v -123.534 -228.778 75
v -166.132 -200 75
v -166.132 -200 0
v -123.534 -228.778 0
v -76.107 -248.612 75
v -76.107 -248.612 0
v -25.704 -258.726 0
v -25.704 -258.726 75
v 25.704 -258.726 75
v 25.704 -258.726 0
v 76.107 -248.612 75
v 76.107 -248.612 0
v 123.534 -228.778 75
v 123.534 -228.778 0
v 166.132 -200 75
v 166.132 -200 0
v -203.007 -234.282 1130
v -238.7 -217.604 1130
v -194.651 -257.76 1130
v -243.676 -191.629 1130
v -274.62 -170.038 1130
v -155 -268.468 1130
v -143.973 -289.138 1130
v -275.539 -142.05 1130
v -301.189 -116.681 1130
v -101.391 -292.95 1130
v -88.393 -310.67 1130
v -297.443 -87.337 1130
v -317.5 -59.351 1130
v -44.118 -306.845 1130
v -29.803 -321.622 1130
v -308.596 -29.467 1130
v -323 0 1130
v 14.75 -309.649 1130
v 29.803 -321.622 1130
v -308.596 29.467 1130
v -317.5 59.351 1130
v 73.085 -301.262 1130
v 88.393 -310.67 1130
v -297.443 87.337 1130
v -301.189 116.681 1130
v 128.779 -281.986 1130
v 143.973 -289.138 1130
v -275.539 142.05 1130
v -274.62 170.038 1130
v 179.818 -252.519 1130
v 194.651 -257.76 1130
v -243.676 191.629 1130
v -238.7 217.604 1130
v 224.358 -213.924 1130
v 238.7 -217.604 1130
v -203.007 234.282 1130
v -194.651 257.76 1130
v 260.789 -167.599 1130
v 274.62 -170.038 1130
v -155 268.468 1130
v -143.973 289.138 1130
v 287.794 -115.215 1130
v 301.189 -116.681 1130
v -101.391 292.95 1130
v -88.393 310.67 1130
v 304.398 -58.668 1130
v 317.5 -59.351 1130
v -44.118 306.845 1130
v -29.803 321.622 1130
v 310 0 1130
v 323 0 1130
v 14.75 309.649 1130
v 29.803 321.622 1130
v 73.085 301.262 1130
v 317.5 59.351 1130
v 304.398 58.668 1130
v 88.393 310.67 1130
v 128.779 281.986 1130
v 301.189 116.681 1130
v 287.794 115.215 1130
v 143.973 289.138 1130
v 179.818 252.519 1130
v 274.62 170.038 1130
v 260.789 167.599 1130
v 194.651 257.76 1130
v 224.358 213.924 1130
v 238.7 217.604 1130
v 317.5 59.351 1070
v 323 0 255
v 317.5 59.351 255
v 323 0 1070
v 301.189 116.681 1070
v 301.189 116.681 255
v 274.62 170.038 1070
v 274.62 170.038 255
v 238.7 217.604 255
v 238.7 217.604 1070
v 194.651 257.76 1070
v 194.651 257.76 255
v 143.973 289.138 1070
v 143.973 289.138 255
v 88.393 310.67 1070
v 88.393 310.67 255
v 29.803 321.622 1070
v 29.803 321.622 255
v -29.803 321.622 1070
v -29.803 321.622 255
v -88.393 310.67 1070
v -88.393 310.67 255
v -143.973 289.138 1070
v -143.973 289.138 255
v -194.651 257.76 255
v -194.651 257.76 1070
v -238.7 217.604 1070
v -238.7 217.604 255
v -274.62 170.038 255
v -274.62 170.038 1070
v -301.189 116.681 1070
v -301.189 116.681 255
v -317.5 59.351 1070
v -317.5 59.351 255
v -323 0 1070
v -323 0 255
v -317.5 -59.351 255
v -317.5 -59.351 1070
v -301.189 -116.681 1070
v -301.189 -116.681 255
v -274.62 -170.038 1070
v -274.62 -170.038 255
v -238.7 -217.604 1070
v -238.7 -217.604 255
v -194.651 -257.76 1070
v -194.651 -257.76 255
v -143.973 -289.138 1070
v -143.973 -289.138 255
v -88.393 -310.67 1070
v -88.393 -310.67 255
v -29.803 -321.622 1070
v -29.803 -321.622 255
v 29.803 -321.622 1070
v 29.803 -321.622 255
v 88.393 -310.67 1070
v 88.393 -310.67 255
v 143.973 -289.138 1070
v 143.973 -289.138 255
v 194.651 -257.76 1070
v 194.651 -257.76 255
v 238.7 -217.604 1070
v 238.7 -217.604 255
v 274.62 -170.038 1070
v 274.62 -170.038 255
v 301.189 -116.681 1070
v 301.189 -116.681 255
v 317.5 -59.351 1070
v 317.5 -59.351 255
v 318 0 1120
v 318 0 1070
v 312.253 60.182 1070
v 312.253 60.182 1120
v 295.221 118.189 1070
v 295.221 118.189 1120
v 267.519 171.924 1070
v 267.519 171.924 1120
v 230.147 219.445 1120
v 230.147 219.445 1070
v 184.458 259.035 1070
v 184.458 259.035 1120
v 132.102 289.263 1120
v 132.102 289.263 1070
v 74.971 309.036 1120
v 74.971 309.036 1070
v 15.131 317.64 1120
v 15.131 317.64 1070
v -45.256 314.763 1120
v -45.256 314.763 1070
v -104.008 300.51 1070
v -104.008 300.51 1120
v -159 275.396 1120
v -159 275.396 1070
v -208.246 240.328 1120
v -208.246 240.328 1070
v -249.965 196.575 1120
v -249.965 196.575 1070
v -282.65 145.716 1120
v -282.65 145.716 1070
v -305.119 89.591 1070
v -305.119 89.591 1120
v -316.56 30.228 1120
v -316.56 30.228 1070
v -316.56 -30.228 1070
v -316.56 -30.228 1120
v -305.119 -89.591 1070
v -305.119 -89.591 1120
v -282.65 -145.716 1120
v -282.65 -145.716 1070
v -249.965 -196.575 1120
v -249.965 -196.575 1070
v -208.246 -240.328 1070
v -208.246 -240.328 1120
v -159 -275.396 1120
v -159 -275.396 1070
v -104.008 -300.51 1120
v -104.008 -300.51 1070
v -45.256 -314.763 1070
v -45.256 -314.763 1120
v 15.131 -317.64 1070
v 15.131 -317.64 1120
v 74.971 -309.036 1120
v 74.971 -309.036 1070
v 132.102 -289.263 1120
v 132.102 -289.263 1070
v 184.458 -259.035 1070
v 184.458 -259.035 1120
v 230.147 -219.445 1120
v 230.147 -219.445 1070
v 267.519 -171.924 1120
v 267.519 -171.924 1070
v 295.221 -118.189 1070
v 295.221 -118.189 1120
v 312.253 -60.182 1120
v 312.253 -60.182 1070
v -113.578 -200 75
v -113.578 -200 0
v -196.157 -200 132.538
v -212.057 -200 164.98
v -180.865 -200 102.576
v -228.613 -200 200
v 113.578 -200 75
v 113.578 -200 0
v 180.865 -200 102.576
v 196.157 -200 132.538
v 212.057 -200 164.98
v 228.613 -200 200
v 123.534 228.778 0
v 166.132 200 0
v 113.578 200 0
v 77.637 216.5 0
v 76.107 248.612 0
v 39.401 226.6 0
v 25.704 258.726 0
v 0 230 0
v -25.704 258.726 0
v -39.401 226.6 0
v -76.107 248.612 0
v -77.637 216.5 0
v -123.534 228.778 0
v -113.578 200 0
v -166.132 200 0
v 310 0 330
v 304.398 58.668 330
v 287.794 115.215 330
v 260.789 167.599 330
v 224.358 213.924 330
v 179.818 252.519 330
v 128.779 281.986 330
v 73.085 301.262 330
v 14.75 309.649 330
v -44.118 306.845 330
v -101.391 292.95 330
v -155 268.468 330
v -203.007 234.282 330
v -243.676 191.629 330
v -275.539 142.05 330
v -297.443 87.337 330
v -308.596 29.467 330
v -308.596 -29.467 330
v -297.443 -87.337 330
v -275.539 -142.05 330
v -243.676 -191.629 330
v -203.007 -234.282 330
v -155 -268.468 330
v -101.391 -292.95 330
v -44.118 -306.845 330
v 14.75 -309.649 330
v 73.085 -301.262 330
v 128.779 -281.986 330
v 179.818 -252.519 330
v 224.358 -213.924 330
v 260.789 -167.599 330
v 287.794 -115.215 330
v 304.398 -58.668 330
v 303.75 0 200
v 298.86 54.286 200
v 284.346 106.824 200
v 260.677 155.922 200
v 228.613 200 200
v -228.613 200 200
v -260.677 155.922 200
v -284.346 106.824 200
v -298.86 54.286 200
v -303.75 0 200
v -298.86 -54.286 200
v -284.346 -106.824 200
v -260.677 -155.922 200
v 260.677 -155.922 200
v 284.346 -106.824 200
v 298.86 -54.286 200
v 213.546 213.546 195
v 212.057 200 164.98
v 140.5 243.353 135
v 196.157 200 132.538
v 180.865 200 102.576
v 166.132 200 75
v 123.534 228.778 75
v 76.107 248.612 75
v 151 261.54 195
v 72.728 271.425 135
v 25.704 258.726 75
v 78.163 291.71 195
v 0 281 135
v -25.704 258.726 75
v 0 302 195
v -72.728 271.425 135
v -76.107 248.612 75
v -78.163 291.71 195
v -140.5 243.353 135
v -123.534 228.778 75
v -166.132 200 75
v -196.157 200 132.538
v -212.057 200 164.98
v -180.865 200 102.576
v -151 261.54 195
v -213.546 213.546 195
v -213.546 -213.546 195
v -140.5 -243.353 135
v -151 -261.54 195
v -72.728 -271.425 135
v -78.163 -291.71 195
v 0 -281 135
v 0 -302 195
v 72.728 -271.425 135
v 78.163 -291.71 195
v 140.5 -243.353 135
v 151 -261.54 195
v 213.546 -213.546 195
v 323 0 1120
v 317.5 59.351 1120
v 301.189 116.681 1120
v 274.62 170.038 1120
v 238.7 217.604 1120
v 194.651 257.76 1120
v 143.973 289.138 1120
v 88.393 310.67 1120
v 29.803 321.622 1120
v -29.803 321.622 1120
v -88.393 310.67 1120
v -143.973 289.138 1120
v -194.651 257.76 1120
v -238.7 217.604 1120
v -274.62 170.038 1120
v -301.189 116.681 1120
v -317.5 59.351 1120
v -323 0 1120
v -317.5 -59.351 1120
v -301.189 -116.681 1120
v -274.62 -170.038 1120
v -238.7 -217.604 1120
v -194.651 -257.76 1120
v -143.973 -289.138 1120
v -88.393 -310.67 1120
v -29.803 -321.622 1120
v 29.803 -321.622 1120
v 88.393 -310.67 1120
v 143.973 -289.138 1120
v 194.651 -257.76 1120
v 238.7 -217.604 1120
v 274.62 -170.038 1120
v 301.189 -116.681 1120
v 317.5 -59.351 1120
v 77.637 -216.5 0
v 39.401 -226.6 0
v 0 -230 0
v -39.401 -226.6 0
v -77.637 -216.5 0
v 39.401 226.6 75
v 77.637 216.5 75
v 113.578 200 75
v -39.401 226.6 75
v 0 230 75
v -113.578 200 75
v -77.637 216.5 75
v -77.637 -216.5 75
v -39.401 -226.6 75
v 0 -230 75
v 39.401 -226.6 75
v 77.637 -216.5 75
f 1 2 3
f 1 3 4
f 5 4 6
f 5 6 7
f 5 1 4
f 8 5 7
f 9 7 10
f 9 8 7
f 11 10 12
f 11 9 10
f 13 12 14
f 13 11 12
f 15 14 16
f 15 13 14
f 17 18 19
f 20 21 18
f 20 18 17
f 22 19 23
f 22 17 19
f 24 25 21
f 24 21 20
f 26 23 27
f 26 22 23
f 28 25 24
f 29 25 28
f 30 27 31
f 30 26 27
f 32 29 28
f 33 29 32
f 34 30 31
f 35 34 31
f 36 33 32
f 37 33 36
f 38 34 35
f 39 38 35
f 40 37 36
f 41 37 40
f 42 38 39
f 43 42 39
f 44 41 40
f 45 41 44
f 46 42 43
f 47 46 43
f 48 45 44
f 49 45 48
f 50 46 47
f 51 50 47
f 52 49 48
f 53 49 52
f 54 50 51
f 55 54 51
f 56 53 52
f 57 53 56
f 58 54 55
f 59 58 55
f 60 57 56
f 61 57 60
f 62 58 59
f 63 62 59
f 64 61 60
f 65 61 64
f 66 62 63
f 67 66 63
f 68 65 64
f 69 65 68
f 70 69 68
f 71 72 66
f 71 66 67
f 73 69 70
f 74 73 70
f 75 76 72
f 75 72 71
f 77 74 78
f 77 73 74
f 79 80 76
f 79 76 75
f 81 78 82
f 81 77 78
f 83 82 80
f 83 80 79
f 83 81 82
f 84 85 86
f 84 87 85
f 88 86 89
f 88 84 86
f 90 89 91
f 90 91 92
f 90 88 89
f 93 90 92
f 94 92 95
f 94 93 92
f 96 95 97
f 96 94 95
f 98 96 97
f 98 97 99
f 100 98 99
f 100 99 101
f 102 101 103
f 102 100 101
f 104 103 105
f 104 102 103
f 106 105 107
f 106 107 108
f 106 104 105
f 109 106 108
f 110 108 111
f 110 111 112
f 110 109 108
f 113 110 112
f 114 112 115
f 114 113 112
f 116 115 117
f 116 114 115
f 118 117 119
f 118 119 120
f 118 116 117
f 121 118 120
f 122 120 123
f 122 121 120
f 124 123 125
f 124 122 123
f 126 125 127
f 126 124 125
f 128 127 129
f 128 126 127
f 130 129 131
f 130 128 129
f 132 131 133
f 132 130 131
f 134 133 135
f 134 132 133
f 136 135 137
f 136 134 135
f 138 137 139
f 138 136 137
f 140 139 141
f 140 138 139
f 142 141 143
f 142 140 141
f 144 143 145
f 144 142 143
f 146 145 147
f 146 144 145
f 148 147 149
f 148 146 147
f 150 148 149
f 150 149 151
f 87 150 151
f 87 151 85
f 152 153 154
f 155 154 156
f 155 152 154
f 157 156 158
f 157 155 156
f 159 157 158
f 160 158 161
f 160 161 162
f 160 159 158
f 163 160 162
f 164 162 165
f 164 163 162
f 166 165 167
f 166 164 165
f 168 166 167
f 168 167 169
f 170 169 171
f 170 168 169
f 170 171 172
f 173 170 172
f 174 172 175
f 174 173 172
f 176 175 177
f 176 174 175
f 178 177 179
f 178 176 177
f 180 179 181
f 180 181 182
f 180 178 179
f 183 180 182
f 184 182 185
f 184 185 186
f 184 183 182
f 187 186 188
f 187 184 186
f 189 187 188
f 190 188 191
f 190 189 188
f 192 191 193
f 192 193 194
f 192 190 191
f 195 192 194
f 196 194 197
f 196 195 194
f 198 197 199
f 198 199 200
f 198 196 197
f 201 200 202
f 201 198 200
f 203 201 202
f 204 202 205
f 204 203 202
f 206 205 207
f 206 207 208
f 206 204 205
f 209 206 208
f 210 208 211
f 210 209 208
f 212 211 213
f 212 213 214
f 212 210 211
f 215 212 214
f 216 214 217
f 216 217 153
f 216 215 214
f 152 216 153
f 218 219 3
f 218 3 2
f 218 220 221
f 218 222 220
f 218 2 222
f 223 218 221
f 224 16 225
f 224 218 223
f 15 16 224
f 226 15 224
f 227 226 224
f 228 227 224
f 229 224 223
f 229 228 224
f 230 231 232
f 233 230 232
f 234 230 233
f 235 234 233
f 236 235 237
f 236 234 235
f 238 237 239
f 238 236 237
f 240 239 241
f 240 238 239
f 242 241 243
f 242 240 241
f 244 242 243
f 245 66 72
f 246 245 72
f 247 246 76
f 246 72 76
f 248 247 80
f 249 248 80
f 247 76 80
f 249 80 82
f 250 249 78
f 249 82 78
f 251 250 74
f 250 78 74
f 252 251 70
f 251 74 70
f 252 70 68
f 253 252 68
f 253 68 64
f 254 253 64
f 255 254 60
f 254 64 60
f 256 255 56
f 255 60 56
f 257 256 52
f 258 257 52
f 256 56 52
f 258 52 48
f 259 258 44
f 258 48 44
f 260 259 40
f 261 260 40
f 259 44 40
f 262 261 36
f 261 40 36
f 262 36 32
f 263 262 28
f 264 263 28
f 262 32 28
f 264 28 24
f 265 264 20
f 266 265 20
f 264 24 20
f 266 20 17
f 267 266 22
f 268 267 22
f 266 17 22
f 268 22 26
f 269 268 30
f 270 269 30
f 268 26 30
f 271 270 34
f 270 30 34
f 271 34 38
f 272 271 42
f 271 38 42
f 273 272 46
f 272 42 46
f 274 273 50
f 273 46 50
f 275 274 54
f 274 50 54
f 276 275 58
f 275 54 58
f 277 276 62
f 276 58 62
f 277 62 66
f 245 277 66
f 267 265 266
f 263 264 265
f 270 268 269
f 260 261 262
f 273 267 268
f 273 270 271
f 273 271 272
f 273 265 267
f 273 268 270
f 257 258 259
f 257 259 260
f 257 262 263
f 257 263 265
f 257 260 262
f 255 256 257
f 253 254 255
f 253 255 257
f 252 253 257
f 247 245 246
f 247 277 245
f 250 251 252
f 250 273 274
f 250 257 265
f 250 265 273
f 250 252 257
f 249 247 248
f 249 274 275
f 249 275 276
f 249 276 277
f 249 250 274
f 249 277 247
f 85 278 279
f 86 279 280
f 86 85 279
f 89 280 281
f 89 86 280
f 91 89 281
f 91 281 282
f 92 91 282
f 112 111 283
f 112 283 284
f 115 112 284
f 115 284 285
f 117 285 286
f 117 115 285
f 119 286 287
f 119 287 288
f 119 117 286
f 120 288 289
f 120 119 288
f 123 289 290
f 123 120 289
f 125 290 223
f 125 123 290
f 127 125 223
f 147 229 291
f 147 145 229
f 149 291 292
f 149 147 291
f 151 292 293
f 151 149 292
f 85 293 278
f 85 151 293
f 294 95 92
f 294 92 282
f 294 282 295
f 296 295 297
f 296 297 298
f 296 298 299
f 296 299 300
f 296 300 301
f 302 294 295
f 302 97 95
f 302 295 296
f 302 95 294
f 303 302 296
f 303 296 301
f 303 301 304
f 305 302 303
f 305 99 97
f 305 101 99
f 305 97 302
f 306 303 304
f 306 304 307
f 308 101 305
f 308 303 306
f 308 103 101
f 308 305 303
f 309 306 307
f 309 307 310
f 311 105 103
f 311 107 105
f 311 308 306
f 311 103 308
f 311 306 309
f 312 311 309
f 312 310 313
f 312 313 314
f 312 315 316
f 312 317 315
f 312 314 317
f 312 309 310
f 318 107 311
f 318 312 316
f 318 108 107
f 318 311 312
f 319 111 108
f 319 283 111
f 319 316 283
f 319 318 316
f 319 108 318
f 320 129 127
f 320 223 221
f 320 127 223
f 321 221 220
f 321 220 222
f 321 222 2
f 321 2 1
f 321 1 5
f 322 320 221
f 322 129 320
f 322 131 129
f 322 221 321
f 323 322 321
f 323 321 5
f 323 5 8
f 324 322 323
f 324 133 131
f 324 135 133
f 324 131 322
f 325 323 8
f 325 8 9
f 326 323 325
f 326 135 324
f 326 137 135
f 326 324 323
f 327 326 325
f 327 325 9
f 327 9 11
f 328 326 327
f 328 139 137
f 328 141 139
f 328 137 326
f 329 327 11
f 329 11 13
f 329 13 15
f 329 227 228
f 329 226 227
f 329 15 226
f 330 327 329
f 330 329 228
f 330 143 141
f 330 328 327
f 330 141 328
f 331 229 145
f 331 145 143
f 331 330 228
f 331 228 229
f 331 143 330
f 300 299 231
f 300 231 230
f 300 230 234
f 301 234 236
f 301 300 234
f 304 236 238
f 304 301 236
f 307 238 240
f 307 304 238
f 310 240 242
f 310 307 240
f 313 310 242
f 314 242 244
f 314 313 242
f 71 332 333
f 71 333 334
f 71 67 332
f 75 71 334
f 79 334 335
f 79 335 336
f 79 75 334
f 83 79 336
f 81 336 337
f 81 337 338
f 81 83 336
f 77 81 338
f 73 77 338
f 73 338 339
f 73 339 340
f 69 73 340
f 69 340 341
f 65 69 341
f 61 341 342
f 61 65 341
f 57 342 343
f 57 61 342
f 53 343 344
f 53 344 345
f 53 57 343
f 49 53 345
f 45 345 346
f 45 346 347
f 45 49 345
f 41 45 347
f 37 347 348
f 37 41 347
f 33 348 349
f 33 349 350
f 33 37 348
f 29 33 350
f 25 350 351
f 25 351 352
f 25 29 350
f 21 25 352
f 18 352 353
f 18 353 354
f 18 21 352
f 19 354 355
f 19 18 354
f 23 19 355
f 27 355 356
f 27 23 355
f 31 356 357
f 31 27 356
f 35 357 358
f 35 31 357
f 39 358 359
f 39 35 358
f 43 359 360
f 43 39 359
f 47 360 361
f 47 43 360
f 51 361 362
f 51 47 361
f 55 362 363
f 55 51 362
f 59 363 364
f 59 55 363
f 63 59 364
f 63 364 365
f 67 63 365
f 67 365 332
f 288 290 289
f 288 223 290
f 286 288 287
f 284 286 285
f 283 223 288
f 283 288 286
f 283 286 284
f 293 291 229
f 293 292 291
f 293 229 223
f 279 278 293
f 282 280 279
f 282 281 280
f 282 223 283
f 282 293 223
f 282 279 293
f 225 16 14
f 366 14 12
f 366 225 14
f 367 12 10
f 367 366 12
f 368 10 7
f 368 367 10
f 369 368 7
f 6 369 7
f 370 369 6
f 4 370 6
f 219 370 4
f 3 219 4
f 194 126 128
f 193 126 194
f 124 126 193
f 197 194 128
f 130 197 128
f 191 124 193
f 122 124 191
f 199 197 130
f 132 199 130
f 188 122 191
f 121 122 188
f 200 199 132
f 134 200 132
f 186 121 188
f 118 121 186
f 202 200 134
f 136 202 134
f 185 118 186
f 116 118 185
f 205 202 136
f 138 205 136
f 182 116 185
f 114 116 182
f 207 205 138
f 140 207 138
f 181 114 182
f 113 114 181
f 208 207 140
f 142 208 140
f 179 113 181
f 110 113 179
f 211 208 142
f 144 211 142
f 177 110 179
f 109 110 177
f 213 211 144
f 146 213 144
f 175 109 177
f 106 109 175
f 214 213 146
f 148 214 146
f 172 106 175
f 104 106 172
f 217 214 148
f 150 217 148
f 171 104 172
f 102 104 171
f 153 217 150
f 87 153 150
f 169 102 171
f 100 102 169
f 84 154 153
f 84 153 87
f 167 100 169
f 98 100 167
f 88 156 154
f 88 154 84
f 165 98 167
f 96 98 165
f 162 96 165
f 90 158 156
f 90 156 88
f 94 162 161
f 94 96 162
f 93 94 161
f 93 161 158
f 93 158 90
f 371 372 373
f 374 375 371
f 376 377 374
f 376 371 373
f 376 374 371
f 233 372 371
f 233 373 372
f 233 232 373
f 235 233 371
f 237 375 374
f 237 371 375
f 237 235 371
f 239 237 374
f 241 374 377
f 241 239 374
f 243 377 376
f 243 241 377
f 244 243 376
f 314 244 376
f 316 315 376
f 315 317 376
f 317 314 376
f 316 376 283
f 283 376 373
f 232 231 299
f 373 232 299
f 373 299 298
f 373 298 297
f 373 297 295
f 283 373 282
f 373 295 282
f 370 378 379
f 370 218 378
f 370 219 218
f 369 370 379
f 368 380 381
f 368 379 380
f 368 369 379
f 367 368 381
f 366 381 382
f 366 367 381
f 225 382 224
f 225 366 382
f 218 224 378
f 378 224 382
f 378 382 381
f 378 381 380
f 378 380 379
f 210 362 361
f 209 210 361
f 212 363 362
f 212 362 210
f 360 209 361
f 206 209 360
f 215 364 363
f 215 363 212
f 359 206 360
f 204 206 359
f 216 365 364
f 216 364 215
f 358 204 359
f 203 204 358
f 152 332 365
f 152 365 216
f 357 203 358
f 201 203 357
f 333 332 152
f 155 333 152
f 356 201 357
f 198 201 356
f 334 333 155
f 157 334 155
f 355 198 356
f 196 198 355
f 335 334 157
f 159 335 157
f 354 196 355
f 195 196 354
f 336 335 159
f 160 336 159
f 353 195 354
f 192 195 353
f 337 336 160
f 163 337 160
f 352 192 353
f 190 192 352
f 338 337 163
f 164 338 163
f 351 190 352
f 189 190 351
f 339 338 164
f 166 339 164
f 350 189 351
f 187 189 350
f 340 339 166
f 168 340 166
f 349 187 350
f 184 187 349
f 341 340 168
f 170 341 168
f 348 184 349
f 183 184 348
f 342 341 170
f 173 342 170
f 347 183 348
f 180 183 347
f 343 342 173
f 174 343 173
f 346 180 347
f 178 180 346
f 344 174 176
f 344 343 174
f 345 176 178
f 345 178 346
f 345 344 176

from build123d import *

# Parameters (mm, degrees)
F2_R     = 310
F3_DEPTH = 800
F4_W     = 400
F4_H     = 250
F5_DEPTH = 323.001
F6_DEPTH = 323.001


with BuildPart() as f1:
    # F0 (on Front) → F1 (revolve)
    with BuildSketch(Plane.XZ):
        Polygon((0, 1130), (0, 0), (30, 0), (30, 75), (230, 75), (230, 0), (260, 0), (260, 75), (323, 255), (323, 1070), (318, 1070), (318, 1120), (323, 1120), (323, 1130), align=None)
    revolve(axis=Axis((0, 0, 565), (0, 0, 1)))

    # F2 (on face) → F3 (cut)
    with BuildSketch(Plane.XY.offset(1130)):
        Circle(F2_R)
    extrude(amount=-F3_DEPTH, mode=Mode.SUBTRACT)

    # F4 (on Right) → F5 (cut, through all)
    with BuildSketch(Plane.YZ):
        with Locations((0, 75)):
            Rectangle(F4_W, F4_H)
    extrude(amount=-F5_DEPTH, mode=Mode.SUBTRACT)

    # F4 (on Right) → F6 (cut, through all)
    with BuildSketch(Plane.YZ):
        with Locations((0, 75)):
            Rectangle(F4_W, F4_H)
    extrude(amount=F6_DEPTH, mode=Mode.SUBTRACT)


solid = f1.part
